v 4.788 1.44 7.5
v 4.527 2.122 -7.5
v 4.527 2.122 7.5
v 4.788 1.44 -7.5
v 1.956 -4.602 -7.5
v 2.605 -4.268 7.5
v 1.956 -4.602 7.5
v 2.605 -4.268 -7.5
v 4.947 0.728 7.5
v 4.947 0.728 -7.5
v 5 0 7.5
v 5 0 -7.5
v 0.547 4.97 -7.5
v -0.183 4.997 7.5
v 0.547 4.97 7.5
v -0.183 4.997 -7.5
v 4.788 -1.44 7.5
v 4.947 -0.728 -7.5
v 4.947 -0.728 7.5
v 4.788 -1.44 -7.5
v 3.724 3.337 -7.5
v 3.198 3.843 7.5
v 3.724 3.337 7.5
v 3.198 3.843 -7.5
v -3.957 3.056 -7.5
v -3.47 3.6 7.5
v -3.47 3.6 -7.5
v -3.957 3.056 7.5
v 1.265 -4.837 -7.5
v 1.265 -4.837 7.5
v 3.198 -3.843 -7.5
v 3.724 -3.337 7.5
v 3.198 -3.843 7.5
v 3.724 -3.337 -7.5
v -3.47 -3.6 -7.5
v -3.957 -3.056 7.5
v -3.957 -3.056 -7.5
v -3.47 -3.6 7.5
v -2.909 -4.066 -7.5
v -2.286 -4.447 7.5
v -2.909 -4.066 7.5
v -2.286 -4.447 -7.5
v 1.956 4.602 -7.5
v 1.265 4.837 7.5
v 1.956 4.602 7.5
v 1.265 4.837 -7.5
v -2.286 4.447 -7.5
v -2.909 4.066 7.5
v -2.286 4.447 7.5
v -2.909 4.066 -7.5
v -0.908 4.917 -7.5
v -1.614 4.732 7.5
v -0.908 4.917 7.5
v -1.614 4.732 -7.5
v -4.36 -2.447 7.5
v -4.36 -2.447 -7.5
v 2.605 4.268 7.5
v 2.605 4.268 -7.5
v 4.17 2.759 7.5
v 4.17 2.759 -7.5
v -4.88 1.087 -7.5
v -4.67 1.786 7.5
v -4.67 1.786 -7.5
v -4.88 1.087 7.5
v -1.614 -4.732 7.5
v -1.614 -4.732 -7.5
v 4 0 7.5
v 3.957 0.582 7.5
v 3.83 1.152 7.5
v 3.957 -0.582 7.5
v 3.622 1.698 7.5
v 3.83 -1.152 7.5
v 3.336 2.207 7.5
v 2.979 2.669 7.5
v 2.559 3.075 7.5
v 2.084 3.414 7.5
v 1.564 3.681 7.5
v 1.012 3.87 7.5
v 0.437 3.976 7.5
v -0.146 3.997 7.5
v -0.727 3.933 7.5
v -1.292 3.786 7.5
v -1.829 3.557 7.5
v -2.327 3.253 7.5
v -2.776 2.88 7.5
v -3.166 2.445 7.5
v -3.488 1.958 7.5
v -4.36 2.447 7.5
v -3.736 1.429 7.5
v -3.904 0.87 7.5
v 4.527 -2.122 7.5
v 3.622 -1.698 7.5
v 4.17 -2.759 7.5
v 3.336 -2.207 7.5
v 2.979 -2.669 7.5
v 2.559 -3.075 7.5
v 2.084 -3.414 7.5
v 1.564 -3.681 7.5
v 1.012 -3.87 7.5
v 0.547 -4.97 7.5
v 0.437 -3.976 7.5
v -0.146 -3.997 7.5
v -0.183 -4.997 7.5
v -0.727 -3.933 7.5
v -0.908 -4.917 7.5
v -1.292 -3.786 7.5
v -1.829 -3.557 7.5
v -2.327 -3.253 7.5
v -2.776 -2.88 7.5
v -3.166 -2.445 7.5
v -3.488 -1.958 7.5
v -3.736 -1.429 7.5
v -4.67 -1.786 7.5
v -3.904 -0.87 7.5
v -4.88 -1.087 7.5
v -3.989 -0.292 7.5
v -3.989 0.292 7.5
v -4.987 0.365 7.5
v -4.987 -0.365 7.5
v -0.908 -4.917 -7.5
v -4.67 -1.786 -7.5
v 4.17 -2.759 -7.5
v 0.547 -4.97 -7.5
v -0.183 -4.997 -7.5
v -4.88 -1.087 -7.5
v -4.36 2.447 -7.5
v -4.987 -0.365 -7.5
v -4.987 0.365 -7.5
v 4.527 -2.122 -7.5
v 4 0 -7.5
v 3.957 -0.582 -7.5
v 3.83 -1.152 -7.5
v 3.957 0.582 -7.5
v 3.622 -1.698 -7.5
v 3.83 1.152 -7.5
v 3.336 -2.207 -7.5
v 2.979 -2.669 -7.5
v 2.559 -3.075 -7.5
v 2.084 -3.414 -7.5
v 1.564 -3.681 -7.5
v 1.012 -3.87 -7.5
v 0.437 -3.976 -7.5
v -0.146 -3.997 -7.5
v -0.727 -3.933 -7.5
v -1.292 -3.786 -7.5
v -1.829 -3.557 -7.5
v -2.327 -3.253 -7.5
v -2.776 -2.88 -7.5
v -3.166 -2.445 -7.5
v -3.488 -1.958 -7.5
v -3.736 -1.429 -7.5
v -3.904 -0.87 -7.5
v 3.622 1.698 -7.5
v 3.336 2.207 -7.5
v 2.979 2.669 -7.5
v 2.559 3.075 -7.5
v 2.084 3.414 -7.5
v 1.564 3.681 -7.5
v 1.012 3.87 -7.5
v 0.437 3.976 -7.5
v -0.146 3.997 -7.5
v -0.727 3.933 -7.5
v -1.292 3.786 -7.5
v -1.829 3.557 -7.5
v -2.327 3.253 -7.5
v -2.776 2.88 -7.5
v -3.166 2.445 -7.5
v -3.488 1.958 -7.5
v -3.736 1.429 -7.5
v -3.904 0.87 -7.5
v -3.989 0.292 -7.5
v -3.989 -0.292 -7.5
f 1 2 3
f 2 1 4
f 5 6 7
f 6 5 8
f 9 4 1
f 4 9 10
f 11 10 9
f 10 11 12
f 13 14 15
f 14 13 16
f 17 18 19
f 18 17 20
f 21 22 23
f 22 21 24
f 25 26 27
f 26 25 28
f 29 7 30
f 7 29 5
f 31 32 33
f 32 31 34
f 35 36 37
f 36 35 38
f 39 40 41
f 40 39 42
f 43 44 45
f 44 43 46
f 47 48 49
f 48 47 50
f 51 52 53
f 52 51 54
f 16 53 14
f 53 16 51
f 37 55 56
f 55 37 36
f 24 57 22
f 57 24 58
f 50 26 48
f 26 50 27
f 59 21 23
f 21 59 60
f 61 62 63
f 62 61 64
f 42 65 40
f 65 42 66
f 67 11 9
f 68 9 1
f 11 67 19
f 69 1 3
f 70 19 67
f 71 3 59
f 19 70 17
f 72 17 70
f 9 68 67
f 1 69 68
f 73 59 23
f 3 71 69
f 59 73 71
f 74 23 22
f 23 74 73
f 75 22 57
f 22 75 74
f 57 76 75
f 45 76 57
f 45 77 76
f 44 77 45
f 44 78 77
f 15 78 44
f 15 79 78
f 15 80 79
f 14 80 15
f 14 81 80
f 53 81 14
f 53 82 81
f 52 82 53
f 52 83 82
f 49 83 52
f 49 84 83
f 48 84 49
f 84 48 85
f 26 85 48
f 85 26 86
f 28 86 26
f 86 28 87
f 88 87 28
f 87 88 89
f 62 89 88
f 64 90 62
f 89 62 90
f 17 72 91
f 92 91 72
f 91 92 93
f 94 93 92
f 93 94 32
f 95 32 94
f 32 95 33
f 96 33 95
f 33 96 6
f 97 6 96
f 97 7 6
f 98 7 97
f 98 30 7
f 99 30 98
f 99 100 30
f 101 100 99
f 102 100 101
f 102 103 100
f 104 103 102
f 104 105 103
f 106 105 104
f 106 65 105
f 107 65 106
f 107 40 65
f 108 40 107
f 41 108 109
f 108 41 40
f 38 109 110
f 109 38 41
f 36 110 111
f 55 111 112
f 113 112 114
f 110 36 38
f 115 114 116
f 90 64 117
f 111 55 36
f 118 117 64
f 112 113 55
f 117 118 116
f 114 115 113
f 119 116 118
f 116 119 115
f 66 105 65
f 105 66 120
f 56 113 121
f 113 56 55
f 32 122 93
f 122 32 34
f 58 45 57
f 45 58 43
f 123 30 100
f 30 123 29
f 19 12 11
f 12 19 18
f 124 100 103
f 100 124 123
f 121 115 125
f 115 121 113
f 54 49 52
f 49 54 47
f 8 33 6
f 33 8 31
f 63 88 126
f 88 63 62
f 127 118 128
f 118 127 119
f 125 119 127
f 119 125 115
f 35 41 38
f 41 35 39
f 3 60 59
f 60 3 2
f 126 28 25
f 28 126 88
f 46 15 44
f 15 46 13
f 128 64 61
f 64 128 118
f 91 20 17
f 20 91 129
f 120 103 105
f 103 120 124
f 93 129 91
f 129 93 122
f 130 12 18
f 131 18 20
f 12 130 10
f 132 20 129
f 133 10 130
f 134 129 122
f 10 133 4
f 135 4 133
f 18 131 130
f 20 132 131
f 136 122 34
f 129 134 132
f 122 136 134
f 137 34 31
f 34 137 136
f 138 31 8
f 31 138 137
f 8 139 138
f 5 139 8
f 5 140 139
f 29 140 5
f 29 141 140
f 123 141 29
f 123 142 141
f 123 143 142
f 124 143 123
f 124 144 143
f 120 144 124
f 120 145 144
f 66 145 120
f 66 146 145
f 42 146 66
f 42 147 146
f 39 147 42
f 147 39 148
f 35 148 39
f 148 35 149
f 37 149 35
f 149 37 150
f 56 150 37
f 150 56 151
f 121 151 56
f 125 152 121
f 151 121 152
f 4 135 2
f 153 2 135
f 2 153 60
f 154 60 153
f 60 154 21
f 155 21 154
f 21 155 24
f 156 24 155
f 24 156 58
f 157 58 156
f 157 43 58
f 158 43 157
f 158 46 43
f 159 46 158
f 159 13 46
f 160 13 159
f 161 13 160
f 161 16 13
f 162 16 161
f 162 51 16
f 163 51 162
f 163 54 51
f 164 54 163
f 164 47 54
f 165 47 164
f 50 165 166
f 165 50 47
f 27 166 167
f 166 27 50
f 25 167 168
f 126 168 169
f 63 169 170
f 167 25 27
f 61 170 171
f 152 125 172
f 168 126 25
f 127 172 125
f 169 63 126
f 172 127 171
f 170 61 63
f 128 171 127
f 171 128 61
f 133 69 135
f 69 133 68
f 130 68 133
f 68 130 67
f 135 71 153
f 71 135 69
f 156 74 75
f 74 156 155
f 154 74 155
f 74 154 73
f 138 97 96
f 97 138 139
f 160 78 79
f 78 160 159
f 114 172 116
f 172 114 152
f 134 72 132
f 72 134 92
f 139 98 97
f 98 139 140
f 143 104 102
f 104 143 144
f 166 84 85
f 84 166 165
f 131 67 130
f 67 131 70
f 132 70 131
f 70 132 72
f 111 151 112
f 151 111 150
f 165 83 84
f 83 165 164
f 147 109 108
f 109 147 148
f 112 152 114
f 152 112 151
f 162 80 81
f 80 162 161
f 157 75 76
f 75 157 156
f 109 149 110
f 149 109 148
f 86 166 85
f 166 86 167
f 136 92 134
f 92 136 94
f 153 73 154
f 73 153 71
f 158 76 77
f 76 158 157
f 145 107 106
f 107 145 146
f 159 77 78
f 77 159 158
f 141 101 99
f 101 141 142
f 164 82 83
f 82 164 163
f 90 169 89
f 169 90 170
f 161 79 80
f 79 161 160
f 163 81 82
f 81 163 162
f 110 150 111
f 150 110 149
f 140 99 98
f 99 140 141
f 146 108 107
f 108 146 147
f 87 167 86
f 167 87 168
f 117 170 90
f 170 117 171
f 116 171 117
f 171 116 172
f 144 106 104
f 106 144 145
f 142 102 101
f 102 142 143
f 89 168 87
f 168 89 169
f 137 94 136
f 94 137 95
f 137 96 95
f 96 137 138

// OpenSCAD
$fn = 43;

difference() {
	cylinder(h = 15, r = 5, center = true);
	cylinder(h = 16, r = 4, center = true);
}
/***********************************************
******      SolidPython code:      *************
************************************************
 
import os

from solid import cylinder
from solid.utils import scad_render_to_file

SEGMENTS = 43


def piece():
    cyl = cylinder(r=5, h=15, center=True) - cylinder(r=4, h=16, center=True)
    return cyl

if __name__ == '__main__':
    out_dir = os.path.join(os.curdir, 'output')
    file_out = os.path.join(out_dir, '%s.scad' % __file__[:-3])
    a = piece()
    print "SCAD file written to: %s" % file_out
    scad_render_to_file(a, file_out, file_header='$fn = %s;' % SEGMENTS)

# :autocmd BufWritePost * silent! !make
 
 
***********************************************/
                            
